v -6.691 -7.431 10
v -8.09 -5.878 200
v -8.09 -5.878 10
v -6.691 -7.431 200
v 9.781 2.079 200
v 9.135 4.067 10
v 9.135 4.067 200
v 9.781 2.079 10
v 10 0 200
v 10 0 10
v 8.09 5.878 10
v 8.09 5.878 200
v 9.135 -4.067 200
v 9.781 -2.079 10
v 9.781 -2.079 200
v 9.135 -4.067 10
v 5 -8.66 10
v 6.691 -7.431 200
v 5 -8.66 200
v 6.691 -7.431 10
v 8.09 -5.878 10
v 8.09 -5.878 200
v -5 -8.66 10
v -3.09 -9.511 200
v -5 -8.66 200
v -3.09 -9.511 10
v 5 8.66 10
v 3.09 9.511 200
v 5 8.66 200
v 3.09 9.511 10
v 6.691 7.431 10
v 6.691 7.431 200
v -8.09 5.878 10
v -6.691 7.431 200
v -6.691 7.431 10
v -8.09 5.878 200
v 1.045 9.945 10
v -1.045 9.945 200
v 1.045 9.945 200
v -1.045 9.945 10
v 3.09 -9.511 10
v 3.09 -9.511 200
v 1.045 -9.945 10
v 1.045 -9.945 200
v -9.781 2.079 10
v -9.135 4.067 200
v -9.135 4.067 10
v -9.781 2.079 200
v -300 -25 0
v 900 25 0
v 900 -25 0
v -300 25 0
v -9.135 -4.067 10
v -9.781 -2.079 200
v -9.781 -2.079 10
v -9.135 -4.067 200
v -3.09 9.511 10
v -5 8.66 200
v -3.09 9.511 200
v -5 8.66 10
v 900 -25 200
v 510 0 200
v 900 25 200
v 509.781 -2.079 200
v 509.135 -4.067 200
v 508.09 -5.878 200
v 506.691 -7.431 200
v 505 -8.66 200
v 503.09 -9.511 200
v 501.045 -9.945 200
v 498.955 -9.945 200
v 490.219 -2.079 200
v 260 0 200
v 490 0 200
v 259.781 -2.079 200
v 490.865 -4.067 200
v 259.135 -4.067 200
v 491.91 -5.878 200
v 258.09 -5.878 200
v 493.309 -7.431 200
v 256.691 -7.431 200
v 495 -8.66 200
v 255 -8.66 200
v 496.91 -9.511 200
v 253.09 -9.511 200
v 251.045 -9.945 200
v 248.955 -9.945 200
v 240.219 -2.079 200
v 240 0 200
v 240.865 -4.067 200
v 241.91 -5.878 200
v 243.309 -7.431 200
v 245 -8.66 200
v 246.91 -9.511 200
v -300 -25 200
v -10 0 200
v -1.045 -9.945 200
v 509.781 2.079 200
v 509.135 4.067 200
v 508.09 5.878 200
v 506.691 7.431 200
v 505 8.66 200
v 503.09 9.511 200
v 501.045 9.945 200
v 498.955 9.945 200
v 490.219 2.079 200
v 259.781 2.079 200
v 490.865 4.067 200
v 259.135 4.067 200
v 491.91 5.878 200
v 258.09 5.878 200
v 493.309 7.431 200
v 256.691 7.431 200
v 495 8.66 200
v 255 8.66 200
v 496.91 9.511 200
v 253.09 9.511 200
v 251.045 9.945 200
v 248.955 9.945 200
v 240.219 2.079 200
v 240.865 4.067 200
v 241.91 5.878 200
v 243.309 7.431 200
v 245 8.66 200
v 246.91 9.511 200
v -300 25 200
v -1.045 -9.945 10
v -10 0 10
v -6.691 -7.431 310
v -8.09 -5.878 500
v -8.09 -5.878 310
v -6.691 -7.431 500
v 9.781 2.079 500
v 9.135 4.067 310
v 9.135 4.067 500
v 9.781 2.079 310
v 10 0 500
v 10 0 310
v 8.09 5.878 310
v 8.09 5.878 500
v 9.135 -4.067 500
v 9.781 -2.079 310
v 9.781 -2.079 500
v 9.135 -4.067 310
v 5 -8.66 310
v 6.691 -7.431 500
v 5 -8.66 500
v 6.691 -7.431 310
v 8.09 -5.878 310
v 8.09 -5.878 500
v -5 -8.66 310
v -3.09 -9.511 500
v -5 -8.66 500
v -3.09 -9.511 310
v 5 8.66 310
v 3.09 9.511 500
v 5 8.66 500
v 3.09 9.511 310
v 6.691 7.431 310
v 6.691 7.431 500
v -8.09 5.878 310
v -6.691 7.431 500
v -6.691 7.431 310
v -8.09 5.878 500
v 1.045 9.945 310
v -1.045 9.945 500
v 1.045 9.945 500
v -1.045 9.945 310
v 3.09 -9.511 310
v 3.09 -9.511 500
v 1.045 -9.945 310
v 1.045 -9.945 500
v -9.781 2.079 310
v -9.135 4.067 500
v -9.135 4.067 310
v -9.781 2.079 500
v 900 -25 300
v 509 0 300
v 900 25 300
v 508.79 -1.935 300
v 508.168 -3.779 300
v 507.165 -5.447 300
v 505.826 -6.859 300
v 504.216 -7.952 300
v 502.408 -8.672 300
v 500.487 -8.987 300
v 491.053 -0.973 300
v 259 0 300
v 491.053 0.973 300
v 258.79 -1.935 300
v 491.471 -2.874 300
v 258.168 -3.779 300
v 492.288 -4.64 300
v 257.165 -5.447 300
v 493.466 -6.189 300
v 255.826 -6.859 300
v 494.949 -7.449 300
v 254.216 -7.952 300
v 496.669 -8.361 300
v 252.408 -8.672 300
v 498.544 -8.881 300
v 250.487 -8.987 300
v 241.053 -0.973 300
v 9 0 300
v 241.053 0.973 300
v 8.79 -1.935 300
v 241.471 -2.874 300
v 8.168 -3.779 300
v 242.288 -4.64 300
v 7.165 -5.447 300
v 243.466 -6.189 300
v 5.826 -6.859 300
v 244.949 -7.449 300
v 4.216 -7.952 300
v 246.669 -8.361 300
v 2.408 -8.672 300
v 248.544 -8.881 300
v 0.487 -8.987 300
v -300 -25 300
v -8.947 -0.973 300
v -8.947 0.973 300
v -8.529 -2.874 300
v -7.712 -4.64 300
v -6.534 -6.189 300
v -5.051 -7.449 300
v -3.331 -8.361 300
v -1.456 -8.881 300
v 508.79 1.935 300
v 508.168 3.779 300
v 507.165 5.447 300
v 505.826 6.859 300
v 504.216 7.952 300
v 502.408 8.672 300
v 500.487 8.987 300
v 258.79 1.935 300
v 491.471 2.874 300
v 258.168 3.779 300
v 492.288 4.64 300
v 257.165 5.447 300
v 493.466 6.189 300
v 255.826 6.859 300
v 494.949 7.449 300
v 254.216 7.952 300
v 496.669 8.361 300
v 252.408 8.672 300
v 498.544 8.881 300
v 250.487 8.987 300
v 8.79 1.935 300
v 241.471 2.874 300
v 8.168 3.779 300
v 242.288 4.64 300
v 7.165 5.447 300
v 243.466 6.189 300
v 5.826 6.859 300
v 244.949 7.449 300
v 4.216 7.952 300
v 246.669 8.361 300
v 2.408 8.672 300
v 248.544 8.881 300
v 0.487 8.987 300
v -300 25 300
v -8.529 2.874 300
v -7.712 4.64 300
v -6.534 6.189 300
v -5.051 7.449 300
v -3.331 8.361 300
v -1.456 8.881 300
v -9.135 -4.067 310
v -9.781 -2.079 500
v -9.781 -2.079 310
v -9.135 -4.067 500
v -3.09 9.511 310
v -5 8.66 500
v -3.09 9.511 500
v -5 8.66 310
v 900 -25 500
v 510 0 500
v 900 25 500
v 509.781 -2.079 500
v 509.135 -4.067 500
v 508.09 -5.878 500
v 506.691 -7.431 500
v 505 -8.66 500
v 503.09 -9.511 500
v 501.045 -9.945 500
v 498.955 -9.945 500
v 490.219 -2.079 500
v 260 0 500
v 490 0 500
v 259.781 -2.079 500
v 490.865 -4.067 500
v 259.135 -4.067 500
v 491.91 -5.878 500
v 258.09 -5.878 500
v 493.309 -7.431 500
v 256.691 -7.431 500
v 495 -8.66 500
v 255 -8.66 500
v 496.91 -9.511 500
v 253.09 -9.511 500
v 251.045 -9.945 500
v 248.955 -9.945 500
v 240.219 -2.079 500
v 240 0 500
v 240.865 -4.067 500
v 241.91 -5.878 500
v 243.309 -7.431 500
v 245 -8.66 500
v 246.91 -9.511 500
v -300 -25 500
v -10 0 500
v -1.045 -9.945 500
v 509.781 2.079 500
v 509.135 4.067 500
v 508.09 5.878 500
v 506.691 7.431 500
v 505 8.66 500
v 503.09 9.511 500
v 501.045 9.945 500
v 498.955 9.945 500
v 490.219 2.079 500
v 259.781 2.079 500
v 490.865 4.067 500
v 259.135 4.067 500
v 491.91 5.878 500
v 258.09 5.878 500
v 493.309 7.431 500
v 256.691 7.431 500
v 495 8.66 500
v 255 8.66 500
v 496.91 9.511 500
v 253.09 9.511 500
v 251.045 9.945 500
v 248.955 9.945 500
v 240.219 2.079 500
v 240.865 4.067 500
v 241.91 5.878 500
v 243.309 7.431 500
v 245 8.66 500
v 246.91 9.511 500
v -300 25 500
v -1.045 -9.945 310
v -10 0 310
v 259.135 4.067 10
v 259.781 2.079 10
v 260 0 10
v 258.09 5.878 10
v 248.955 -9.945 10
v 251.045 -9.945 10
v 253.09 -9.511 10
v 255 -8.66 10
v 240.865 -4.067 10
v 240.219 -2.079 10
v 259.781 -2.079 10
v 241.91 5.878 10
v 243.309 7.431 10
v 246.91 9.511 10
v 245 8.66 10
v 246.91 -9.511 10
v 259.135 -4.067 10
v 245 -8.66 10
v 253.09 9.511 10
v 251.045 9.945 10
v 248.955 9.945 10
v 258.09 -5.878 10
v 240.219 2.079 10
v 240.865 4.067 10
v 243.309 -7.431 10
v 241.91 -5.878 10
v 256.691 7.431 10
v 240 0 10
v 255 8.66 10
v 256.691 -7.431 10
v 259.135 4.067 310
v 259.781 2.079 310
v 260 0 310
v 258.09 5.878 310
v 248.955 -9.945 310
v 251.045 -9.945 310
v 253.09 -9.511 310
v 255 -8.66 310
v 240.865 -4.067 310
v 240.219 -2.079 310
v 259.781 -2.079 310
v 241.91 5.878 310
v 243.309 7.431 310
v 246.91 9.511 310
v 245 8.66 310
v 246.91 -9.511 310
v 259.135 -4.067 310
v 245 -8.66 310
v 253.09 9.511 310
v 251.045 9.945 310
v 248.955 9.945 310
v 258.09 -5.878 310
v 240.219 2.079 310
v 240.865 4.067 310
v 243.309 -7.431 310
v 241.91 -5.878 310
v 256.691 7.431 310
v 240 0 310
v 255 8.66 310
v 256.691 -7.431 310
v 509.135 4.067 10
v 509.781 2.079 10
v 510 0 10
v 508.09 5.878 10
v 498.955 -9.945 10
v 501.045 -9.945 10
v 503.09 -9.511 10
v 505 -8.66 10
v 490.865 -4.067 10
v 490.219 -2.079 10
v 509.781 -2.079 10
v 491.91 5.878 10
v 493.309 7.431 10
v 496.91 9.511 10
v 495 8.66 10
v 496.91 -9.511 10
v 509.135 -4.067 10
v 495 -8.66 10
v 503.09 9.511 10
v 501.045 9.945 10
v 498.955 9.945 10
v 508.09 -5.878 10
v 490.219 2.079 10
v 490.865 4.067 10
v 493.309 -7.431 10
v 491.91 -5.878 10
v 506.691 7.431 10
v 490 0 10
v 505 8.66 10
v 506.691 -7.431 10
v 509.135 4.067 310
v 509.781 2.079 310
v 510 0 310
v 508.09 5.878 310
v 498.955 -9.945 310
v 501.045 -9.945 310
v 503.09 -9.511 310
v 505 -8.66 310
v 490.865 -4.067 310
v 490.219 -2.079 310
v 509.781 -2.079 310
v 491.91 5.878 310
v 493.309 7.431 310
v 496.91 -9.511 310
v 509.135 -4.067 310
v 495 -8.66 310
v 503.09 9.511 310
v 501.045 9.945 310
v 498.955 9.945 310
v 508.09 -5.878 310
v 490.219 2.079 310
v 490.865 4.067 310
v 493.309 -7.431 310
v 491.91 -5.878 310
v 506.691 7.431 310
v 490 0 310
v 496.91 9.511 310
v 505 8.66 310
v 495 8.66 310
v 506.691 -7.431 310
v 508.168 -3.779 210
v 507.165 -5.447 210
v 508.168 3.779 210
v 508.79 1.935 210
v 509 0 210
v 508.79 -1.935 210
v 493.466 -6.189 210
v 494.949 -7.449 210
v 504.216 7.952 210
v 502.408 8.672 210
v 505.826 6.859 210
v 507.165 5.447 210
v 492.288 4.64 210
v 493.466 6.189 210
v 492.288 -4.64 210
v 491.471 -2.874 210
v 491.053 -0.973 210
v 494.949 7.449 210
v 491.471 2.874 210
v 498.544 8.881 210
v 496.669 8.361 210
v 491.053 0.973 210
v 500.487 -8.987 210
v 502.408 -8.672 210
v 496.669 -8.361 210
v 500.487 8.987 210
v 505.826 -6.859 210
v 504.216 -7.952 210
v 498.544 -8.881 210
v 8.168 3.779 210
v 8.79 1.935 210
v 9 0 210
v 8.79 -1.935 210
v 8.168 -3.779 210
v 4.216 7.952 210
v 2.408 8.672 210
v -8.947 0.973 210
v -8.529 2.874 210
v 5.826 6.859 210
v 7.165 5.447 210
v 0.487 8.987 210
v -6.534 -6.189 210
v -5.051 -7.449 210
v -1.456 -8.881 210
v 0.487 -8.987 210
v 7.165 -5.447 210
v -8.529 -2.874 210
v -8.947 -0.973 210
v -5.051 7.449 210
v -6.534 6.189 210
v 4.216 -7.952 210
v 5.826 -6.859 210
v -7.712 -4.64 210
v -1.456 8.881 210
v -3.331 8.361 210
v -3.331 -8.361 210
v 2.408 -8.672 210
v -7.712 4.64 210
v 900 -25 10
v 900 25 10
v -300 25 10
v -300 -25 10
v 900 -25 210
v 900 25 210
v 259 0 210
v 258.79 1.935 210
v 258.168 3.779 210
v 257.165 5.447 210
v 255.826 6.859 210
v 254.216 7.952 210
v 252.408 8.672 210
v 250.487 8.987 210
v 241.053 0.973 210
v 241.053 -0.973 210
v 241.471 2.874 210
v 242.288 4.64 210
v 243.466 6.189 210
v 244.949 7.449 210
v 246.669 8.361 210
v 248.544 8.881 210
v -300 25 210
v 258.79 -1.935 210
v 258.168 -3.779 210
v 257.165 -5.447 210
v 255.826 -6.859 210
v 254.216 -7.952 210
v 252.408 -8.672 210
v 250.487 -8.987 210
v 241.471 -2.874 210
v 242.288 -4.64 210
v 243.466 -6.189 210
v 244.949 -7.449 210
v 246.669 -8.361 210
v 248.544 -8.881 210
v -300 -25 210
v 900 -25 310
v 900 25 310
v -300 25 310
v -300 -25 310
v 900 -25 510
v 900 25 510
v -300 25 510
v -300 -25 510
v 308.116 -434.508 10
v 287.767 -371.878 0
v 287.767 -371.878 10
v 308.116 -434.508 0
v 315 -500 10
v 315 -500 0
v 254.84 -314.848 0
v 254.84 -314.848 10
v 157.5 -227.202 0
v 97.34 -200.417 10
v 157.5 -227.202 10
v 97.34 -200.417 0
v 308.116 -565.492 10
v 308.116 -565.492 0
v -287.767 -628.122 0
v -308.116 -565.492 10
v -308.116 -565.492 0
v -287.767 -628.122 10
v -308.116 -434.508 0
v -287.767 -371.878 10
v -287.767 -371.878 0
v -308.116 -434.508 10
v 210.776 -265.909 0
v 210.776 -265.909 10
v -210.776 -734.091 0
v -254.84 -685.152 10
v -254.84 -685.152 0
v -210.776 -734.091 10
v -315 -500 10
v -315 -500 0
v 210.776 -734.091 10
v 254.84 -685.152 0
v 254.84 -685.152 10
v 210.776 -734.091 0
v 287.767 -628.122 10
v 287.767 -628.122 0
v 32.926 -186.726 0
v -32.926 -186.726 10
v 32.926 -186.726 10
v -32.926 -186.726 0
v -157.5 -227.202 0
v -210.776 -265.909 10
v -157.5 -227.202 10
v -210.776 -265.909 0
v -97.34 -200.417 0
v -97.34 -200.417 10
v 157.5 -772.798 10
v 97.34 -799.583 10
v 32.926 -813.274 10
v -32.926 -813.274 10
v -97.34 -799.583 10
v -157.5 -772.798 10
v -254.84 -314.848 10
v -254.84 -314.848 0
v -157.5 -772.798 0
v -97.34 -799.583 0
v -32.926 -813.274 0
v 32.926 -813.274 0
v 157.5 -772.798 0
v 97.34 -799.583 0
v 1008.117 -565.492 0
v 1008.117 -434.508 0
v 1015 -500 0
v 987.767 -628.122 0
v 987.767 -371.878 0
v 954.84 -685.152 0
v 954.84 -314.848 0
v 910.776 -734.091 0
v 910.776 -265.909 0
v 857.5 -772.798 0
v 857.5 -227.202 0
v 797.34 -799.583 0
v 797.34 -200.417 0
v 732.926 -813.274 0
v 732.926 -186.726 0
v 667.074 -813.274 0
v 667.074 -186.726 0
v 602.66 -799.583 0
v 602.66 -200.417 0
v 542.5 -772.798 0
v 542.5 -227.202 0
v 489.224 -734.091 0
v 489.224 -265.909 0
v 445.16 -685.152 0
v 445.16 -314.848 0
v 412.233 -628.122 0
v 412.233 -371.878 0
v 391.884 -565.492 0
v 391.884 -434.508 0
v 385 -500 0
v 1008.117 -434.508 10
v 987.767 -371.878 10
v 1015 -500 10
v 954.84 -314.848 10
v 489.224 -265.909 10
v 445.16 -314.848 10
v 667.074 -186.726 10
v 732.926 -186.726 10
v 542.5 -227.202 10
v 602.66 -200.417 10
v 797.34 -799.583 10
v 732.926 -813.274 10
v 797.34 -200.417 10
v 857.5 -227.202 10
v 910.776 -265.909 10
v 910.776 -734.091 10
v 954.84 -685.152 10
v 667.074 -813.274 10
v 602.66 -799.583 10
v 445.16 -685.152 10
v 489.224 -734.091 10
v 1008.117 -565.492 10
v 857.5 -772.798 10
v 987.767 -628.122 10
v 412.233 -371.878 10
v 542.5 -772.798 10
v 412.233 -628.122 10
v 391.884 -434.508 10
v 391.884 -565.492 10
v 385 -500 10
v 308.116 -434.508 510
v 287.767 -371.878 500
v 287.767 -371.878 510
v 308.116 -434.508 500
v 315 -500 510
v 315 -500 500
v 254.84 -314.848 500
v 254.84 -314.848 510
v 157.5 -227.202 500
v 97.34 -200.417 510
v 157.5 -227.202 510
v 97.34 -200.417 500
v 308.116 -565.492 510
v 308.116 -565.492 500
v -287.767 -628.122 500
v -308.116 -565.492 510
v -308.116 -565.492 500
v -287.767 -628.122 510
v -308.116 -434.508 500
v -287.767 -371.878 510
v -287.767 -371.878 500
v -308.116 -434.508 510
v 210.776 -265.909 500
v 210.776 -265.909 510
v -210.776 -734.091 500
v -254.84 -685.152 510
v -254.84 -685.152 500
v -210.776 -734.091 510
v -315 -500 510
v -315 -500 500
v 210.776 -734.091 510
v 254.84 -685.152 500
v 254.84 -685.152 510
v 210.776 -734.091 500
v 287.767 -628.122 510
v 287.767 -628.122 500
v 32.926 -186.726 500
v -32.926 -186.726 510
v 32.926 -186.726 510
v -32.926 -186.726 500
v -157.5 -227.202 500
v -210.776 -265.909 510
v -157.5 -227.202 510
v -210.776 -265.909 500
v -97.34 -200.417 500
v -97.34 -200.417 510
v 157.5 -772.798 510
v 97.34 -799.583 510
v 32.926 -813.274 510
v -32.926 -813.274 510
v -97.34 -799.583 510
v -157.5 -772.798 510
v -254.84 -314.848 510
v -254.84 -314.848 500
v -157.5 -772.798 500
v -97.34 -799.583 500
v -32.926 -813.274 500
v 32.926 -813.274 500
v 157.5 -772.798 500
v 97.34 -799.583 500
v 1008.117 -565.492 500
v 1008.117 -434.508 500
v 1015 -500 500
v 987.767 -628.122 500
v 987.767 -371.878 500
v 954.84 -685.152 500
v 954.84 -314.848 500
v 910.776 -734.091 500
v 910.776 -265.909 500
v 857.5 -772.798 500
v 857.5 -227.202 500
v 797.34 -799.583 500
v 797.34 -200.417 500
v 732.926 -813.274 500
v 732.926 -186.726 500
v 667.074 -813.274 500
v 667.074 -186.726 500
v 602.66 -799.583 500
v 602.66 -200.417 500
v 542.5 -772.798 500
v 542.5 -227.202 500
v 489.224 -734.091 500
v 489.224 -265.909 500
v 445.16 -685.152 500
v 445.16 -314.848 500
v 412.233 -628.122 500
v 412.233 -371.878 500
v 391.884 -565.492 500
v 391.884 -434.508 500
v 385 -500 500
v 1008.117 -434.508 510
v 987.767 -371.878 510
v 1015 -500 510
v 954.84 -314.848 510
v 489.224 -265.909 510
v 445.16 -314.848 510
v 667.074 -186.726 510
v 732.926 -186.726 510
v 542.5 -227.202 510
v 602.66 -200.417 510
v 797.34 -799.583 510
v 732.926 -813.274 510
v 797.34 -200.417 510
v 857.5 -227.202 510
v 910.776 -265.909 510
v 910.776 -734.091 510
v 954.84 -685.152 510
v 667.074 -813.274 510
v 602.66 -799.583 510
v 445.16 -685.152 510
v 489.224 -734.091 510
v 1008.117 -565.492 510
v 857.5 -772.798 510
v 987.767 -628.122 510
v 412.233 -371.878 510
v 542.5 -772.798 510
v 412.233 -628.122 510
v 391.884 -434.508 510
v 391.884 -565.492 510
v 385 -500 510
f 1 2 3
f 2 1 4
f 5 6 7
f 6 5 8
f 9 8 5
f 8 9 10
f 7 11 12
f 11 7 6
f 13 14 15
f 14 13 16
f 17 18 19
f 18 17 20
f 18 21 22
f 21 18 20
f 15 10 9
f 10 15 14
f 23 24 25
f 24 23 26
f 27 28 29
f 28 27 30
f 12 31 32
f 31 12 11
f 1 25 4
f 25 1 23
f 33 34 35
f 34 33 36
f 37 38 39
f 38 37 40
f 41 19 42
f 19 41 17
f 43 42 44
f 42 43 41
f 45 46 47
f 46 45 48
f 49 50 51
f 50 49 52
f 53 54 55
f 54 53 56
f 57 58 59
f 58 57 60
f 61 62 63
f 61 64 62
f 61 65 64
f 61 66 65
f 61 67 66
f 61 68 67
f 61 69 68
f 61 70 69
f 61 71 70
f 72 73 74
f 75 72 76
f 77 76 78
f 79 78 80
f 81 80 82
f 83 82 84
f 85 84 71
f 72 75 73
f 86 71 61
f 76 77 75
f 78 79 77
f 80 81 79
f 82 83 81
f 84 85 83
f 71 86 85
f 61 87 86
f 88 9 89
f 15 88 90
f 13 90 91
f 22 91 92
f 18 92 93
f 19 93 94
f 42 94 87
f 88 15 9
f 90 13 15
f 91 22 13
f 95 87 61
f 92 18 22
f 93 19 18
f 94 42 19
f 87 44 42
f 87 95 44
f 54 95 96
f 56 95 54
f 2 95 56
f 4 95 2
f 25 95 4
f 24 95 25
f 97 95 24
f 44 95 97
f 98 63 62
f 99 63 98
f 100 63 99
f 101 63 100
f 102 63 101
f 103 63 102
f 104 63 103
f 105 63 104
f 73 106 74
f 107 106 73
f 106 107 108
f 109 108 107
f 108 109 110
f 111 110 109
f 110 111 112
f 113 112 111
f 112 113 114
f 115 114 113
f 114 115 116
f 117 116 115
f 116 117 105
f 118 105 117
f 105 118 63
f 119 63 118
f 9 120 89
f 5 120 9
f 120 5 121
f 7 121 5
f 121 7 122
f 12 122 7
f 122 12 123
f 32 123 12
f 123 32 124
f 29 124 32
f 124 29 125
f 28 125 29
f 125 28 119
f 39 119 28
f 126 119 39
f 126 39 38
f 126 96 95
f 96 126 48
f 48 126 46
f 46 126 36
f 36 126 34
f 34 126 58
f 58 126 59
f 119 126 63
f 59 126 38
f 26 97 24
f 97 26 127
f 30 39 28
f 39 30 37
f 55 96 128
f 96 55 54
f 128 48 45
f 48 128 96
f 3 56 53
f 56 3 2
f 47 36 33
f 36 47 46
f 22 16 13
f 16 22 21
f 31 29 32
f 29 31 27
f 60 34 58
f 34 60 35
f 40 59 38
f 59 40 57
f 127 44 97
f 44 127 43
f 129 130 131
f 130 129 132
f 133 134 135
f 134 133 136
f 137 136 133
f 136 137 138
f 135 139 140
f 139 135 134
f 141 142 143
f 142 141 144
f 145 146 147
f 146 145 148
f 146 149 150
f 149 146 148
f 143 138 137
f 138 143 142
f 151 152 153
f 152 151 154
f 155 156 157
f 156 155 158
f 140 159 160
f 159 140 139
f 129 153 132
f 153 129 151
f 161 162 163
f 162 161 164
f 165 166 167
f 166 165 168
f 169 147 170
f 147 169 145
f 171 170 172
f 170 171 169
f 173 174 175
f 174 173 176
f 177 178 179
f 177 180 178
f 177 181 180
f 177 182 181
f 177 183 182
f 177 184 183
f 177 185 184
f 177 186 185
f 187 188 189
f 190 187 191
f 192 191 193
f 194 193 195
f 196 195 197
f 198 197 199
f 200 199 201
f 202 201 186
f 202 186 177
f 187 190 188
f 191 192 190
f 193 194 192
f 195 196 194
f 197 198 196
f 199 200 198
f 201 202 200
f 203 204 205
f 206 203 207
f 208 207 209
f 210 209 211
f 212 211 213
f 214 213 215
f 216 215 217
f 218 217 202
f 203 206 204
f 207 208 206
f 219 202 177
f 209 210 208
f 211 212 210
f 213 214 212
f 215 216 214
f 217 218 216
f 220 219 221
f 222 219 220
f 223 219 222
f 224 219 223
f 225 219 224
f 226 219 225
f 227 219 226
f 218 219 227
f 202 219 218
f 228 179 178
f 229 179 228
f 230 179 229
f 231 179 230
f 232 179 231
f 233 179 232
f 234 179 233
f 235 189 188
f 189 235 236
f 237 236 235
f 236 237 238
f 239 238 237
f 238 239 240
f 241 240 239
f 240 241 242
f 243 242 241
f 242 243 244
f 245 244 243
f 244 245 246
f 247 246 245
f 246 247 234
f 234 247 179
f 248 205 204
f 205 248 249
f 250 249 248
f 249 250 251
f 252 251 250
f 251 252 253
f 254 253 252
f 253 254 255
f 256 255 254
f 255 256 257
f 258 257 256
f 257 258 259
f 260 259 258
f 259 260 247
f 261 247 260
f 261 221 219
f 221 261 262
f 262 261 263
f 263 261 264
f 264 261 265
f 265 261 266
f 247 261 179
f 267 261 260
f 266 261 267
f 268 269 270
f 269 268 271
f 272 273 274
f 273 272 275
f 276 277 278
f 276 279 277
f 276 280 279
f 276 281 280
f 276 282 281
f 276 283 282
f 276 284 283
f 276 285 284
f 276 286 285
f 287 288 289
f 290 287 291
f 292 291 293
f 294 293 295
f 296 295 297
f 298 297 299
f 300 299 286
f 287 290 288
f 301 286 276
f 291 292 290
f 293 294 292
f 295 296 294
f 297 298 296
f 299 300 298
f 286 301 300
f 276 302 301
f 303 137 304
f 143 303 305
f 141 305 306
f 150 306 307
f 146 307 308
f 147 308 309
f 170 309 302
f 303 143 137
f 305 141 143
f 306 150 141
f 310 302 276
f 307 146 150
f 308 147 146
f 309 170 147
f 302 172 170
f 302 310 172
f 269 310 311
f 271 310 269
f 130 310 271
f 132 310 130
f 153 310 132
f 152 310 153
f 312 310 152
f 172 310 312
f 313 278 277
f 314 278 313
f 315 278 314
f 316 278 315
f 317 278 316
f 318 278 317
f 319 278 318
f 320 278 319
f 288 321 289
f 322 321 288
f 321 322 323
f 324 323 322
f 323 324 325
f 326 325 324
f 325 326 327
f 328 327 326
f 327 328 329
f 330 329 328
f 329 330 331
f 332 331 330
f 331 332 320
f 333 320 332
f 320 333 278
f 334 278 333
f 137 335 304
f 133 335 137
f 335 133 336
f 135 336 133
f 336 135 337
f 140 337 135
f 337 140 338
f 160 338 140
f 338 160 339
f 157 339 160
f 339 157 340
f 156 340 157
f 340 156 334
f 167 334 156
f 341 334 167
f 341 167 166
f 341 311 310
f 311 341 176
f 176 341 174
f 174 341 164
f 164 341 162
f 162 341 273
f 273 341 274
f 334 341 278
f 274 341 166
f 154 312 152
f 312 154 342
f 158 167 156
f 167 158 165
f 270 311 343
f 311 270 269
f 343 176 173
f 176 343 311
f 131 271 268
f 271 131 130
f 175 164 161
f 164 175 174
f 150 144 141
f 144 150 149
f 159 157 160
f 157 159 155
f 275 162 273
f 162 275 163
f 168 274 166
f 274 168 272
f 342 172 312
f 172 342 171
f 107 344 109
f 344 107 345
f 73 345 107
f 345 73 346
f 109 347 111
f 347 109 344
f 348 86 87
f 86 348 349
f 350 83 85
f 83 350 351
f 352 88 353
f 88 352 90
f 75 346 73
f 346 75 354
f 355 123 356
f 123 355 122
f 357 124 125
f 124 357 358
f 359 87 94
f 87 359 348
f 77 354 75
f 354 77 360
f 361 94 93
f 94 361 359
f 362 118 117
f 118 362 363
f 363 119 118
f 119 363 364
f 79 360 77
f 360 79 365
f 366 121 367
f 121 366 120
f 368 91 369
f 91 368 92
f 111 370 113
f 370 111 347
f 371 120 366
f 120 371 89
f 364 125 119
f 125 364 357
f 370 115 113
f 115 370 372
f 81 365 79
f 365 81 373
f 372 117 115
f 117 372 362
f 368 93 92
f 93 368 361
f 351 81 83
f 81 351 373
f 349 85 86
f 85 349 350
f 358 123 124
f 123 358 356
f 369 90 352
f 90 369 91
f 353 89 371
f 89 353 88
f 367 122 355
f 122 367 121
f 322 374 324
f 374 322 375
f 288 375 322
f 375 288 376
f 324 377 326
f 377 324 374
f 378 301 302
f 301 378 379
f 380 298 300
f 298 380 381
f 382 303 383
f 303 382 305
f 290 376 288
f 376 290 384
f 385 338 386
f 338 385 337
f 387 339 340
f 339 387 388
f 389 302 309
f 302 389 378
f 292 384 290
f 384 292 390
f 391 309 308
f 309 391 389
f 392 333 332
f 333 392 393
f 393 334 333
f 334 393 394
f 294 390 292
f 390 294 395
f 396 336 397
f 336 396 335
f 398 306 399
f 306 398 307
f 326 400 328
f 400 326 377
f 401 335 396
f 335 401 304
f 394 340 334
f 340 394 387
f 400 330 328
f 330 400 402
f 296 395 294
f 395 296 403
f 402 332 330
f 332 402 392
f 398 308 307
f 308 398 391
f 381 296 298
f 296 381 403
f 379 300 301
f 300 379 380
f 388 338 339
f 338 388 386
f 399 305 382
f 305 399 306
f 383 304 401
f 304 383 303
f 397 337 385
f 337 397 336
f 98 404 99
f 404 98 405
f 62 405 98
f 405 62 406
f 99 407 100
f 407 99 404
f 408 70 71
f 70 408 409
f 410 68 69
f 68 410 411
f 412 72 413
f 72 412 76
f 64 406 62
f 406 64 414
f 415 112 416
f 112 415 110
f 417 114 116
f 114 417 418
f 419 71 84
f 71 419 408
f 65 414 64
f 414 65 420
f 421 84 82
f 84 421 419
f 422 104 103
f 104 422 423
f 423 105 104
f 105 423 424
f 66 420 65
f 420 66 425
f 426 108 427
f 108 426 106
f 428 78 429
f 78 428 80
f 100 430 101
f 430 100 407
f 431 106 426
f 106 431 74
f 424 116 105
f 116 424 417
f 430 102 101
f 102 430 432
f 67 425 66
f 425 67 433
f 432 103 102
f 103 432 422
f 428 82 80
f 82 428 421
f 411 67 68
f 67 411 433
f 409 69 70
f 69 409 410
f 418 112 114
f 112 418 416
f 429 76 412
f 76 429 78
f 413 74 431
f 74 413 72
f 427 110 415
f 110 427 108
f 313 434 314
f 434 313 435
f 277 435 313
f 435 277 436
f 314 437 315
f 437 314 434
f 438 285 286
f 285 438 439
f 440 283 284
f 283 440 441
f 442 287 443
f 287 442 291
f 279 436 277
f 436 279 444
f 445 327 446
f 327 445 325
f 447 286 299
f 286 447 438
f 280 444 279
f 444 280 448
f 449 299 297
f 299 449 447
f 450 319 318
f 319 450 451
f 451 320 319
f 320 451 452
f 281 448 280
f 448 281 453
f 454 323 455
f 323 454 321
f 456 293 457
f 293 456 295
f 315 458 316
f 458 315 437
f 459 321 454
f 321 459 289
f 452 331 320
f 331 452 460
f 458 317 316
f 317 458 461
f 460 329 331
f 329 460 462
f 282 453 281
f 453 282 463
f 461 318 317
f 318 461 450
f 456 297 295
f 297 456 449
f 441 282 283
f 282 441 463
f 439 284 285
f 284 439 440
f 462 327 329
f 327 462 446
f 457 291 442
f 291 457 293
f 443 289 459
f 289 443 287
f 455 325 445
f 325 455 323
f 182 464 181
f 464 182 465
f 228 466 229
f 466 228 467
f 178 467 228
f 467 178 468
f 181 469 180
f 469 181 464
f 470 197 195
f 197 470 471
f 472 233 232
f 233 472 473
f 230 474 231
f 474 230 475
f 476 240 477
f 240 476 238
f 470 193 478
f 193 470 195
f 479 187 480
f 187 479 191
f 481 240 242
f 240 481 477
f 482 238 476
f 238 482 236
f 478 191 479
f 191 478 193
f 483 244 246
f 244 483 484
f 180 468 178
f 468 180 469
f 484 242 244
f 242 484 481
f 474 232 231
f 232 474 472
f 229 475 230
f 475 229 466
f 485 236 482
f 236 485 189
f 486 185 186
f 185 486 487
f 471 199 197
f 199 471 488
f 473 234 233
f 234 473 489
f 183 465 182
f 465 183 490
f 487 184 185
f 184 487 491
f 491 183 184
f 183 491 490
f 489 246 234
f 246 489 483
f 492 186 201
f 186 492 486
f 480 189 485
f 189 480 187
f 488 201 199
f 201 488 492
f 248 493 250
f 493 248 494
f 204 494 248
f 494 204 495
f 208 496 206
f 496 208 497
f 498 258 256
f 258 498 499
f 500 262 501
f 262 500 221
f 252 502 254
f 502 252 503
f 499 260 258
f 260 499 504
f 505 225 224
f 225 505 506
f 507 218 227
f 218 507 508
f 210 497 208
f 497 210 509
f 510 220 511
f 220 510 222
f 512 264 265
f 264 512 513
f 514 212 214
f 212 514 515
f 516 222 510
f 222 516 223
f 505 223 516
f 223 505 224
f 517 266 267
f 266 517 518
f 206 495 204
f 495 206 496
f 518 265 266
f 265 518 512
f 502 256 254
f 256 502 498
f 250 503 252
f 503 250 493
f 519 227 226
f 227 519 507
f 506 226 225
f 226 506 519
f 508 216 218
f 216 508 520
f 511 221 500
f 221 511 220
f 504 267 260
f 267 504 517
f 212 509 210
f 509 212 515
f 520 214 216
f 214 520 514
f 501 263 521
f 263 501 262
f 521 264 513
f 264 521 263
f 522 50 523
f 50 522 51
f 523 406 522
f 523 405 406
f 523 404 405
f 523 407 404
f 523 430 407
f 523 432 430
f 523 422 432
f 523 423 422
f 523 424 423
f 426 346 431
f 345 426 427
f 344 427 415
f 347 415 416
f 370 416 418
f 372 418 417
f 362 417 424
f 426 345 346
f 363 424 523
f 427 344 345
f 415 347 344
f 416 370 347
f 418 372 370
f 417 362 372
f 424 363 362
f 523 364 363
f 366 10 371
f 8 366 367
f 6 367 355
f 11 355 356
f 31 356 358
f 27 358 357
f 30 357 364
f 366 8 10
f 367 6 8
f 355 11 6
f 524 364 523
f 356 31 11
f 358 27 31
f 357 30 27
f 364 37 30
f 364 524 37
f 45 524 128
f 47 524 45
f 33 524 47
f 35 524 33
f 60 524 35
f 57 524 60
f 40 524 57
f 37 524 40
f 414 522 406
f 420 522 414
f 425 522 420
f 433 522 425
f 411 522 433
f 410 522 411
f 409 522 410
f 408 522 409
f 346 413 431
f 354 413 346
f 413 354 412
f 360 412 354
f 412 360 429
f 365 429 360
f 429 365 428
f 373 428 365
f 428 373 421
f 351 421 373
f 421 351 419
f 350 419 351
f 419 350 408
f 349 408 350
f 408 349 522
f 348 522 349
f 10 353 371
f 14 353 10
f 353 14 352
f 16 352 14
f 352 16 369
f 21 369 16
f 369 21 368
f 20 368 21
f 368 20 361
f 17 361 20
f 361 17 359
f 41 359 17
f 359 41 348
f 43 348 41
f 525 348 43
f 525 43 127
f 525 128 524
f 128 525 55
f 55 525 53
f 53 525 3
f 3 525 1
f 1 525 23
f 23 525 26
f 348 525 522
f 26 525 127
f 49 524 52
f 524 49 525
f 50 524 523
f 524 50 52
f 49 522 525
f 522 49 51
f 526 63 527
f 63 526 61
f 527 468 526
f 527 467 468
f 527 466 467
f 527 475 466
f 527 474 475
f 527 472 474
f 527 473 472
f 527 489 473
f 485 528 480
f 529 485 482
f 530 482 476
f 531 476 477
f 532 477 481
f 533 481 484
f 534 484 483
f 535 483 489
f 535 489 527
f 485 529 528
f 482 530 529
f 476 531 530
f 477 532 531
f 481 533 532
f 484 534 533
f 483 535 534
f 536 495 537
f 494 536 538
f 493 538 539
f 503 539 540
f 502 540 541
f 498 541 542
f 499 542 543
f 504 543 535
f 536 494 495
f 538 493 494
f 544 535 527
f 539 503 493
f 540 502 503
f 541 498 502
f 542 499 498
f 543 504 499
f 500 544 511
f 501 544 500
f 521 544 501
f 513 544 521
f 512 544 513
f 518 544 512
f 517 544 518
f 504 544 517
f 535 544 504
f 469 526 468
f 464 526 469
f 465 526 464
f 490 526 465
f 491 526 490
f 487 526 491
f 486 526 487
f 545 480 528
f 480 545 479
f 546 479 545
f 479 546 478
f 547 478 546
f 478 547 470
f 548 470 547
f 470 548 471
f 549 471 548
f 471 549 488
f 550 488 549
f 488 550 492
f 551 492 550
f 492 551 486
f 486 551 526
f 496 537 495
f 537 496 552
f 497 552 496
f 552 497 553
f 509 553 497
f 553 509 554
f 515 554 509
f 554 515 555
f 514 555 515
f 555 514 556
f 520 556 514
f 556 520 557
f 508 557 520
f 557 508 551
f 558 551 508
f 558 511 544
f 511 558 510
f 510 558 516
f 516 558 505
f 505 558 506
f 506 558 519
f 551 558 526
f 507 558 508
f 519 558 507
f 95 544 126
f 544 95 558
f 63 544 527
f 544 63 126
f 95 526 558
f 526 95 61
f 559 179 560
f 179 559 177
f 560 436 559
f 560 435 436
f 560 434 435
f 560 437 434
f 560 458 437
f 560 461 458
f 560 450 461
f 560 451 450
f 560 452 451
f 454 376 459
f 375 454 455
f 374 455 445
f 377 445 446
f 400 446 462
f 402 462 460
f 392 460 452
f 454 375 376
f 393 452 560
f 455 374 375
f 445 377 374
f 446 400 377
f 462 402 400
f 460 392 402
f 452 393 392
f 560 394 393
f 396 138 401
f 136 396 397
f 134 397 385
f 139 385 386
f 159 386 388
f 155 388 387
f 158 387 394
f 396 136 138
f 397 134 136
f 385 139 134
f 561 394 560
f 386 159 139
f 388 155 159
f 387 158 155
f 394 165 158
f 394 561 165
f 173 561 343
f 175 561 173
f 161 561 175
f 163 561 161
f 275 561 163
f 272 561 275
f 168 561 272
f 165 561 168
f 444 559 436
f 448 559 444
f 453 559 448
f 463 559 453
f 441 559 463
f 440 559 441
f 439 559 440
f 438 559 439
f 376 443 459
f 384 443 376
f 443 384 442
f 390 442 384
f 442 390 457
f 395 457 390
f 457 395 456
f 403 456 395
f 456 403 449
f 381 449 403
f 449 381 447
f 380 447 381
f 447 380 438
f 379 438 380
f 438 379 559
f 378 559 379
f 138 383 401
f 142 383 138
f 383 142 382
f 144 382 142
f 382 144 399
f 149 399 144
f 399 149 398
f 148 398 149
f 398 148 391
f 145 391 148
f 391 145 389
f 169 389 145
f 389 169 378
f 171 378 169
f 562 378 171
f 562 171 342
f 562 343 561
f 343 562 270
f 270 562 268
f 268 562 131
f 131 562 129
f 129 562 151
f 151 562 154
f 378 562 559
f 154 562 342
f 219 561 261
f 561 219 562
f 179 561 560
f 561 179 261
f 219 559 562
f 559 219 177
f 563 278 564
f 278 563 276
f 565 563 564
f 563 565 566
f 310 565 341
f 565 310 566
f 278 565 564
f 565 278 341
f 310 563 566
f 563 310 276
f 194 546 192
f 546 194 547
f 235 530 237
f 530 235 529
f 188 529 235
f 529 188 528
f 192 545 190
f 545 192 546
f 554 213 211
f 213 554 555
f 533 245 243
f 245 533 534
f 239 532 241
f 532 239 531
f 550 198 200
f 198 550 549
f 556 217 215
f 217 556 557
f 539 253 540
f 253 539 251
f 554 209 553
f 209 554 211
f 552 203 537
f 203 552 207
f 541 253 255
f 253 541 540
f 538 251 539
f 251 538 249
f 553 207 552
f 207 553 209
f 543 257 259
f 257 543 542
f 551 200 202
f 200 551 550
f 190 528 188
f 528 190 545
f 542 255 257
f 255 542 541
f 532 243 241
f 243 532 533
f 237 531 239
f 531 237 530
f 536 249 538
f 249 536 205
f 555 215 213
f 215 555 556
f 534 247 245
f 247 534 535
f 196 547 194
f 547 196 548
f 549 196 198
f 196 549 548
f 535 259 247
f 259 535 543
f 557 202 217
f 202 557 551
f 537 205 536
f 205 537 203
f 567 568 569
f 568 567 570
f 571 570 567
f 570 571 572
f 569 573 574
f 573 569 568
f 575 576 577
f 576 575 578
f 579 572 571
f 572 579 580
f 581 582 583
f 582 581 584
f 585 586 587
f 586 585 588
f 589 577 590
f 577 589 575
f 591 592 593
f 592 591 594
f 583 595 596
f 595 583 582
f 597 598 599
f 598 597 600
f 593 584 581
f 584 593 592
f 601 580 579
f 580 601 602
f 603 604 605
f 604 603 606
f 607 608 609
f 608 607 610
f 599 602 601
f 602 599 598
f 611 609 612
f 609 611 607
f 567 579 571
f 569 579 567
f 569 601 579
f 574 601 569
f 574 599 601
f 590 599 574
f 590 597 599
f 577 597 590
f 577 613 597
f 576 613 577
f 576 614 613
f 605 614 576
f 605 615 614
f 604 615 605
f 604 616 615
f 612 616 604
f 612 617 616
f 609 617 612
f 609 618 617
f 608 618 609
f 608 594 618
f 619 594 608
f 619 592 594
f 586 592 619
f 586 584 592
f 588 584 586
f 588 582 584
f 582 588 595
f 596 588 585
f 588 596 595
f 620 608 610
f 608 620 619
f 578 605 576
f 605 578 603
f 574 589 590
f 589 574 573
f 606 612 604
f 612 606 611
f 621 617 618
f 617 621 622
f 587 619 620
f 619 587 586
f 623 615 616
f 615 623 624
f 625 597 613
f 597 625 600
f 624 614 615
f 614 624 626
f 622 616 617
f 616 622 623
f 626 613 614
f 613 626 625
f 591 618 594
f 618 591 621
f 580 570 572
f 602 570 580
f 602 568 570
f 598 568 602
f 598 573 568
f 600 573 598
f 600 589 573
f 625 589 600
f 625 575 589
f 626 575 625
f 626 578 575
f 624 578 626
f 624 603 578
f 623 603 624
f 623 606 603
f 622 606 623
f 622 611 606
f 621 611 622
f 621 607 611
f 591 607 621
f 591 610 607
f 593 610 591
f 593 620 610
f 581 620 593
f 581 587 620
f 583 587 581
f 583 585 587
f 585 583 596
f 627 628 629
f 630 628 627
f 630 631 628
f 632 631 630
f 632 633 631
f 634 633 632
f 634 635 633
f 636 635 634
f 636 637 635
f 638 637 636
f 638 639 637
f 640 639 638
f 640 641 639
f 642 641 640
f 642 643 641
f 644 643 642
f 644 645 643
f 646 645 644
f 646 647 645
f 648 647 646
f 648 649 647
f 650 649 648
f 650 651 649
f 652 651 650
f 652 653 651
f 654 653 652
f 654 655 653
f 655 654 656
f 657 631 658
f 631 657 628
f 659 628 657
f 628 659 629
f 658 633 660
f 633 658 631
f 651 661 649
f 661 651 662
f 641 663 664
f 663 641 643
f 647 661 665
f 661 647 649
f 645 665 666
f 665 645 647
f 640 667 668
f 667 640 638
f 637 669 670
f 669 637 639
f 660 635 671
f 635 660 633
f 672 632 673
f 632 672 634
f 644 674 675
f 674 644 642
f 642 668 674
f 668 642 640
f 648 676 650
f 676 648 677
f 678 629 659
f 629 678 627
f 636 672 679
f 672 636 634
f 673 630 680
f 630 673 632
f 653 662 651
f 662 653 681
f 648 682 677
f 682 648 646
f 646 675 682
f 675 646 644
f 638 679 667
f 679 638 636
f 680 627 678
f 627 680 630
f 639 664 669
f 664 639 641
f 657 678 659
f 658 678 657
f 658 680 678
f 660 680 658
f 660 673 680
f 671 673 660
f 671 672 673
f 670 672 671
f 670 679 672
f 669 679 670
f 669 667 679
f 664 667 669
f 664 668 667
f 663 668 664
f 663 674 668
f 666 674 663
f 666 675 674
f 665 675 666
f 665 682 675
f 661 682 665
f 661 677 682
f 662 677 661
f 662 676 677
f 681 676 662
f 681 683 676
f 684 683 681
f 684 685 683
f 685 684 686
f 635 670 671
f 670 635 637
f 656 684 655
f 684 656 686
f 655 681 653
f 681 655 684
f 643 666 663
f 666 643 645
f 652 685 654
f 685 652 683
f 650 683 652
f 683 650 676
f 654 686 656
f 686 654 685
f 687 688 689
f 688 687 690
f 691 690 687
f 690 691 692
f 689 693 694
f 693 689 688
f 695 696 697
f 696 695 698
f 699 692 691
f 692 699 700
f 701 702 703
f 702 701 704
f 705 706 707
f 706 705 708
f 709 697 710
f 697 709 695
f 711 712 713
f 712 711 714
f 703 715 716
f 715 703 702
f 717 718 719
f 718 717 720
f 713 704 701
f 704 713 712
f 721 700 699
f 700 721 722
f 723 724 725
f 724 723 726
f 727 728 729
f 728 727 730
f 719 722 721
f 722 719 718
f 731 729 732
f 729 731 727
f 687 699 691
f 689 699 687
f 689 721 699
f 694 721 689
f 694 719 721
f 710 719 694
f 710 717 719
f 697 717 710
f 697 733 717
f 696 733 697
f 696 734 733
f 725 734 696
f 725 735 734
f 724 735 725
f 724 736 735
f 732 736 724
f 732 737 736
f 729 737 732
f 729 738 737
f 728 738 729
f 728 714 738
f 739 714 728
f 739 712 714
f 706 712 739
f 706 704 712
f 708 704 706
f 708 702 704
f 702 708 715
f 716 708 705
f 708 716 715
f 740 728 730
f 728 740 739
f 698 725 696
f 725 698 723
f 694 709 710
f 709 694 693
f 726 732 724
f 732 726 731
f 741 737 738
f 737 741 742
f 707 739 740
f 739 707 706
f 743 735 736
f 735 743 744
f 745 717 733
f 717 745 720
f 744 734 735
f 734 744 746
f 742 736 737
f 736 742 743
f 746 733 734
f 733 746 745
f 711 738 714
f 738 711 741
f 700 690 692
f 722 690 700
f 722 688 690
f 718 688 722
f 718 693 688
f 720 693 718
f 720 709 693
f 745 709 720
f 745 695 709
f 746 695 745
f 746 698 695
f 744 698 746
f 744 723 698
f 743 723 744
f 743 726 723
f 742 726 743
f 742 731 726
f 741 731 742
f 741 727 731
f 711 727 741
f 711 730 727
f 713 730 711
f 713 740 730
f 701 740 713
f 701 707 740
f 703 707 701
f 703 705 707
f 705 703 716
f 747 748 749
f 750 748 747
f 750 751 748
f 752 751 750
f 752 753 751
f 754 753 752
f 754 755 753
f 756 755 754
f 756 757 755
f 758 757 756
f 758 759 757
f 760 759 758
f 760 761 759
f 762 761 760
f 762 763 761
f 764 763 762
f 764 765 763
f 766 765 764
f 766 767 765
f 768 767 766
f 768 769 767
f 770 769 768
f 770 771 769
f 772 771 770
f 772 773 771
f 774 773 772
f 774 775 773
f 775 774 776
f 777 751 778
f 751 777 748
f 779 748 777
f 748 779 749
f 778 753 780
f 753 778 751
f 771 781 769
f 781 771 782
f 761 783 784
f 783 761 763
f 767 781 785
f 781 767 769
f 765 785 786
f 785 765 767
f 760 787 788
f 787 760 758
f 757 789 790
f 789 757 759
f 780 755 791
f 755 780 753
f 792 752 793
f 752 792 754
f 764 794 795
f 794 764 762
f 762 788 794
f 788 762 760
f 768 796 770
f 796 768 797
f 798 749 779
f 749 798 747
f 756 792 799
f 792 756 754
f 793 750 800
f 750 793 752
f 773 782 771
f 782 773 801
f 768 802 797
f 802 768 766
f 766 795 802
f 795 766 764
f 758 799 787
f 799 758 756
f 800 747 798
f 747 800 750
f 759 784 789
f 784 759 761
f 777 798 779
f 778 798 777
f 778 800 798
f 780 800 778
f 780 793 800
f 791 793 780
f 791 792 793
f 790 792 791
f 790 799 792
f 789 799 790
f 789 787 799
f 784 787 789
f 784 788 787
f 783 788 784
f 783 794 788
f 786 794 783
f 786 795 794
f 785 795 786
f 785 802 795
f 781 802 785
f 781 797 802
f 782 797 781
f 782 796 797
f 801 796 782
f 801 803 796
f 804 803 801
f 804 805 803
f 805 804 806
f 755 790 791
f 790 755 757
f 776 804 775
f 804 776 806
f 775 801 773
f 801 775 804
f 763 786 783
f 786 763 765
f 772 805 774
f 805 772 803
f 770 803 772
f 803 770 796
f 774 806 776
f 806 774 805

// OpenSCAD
/**
直線番長アイデア出し
真ん中ボールねじ
両脇シャフトで延長
**/
translate([-300,-25,0])cube([1200, 50, 10]);
translate([-300,-25,200])cube([1200, 50, 10]);
translate([-300,-25,300])cube([1200, 50, 10]);
translate([-300,-25,500])cube([1200, 50, 10]);
color("gray"){
translate([0,0,0])cylinder(r=10, h=200);
translate([0,0,300])cylinder(r=10, h=200);
translate([250,0,0])cylinder(r=10, h=200);
translate([250,0,300])cylinder(r=10, h=200);
translate([500,0,0])cylinder(r=10, h=200);
translate([500,0,300])cylinder(r=10, h=200);
}
color("black"){
translate([500,0,200])cylinder(r=9, h=200);
    translate([0,0,200])cylinder(r=9, h=200);
}
//ボールねじ
translate([250,0,200])cylinder(r=9, h=200);
//車輪

color("pink")translate([0,-500,0])rotate([0,0,0])cylinder(r=315, h=10);
color("pink")translate([700,-500,0])rotate([0,0,0])cylinder(r=315, h=10);
color("pink")translate([0,-500,500])rotate([0,0,0])cylinder(r=315, h=10);
color("pink")translate([700,-500,500])rotate([0,0,0])cylinder(r=315, h=10);
